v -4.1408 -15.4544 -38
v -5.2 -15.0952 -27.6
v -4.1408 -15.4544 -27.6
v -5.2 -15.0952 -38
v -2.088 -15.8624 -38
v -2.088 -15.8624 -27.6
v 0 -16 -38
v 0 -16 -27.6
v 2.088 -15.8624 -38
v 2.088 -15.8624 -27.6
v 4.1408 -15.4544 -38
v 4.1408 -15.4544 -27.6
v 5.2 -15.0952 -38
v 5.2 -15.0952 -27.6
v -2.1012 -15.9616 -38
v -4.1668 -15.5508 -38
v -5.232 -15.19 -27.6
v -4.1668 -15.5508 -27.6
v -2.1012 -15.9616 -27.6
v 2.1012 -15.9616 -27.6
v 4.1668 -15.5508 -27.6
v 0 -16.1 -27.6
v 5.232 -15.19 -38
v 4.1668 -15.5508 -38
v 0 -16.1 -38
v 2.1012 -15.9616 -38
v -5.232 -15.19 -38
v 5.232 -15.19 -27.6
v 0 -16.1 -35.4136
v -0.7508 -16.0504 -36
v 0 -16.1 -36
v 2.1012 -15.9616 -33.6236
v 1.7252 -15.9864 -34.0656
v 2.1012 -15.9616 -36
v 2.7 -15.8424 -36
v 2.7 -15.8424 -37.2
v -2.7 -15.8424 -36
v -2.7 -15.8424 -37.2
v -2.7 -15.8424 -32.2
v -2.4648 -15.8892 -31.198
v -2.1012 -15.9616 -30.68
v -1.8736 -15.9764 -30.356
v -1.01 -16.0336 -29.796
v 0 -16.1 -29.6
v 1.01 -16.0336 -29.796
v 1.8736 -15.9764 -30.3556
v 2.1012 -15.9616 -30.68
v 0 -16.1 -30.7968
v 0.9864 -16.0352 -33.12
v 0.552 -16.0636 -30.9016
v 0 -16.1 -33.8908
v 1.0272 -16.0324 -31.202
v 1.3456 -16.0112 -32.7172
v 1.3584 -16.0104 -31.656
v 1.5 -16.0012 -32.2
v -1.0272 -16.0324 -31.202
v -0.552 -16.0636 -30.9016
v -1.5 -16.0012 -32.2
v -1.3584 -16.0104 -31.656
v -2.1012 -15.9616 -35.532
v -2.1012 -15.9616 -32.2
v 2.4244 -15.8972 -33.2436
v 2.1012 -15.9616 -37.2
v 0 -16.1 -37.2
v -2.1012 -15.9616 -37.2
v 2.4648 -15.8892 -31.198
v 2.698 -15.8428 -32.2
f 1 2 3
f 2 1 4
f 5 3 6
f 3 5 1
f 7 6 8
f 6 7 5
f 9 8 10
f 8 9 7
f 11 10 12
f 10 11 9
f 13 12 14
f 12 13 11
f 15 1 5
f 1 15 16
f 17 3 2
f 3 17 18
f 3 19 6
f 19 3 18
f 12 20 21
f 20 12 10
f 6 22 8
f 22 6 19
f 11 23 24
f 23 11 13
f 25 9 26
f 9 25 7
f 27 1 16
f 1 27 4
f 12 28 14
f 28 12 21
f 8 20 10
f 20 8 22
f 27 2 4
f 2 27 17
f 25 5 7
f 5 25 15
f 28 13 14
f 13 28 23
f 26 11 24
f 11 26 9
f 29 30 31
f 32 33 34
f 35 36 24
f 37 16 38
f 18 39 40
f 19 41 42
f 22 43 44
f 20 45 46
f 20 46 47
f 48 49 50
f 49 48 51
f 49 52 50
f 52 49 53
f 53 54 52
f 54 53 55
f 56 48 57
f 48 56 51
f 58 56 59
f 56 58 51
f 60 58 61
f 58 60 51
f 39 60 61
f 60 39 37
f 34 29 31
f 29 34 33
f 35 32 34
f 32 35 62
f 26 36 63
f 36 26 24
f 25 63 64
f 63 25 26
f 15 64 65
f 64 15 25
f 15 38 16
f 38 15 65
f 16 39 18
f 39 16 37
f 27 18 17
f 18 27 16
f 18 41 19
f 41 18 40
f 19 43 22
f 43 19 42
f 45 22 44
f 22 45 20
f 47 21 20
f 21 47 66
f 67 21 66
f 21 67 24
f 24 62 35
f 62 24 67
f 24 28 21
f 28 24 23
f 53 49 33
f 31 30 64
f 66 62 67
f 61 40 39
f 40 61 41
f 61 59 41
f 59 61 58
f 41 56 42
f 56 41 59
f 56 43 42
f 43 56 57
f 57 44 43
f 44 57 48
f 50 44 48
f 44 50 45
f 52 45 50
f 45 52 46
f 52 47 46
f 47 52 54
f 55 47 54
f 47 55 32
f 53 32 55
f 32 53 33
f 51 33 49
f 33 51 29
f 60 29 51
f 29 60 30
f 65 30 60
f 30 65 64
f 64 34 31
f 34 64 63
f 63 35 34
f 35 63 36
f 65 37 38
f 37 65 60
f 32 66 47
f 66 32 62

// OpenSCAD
// file: s/6259b01.scad
use <../../lib.scad>
function ldraw_lib__s__6259b01() = [
// 0 ~Sticker Back  1.3 x  1.3 (Formed)
// 0 Name: s\6259b01.dat
// 0 Author: Chris Böhnke [KnightOfTarenta]
// 0 !LDRAW_ORG Subpart UPDATE 2026-06
// 0 !LICENSE Licensed under CC BY 4.0 : see CAreadme.txt
// 
// 0 BFC CERTIFY CCW
  [0,"BFC","CERTIFY"],
  [0,"BFC","CCW"],
// 
// 0 !HISTORY 2026-06-28 [OrionP] Official Update 2026-06
// 
// 0 // Sticker Backside
// 4 16 -13 69 -37.738 -10.352 69 -38.636 -10.352 95 -38.636 -13 95 -37.738
  [4,16,-13,69,-37.738,-10.352,69,-38.636,-10.352,95,-38.636,-13,95,-37.738],
// 4 16 -10.352 69 -38.636 -5.22 69 -39.656 -5.22 95 -39.656 -10.352 95 -38.636
  [4,16,-10.352,69,-38.636,-5.22,69,-39.656,-5.22,95,-39.656,-10.352,95,-38.636],
// 4 16 -5.22 95 -39.656 -5.22 69 -39.656 0 69 -40 0 95 -40
  [4,16,-5.22,95,-39.656,-5.22,69,-39.656,0,69,-40,0,95,-40],
// 4 16 0 69 -40 5.22 69 -39.656 5.22 95 -39.656 0 95 -40
  [4,16,0,69,-40,5.22,69,-39.656,5.22,95,-39.656,0,95,-40],
// 4 16 5.22 69 -39.656 10.352 69 -38.636 10.352 95 -38.636 5.22 95 -39.656
  [4,16,5.22,69,-39.656,10.352,69,-38.636,10.352,95,-38.636,5.22,95,-39.656],
// 4 16 10.352 69 -38.636 13 69 -37.738 13 95 -37.738 10.352 95 -38.636
  [4,16,10.352,69,-38.636,13,69,-37.738,13,95,-37.738,10.352,95,-38.636],
// 
// 0 // Conditional Lines Back
// 5 24 -10.352 69 -38.636 -10.352 95 -38.636 -5.22 69 -39.656 -13 95 -37.738
  [5,24,-10.352,69,-38.636,-10.352,95,-38.636,-5.22,69,-39.656,-13,95,-37.738],
// 5 24 -5.22 69 -39.656 -5.22 95 -39.656 0 69 -40 -10.352 95 -38.636
  [5,24,-5.22,69,-39.656,-5.22,95,-39.656,0,69,-40,-10.352,95,-38.636],
// 5 24 10.352 69 -38.636 10.352 95 -38.636 5.22 95 -39.656 13 69 -37.738
  [5,24,10.352,69,-38.636,10.352,95,-38.636,5.22,95,-39.656,13,69,-37.738],
// 5 24 0 69 -40 0 95 -40 5.22 69 -39.656 -5.22 95 -39.656
  [5,24,0,69,-40,0,95,-40,5.22,69,-39.656,-5.22,95,-39.656],
// 5 24 5.22 69 -39.656 5.22 95 -39.656 10.352 69 -38.636 0 95 -40
  [5,24,5.22,69,-39.656,5.22,95,-39.656,10.352,69,-38.636,0,95,-40],
// 
// 0 // Sticker Sides
// 4 16 -10.417 95 -38.877 -10.352 95 -38.636 -5.22 95 -39.656 -5.253 95 -39.904
  [4,16,-10.417,95,-38.877,-10.352,95,-38.636,-5.22,95,-39.656,-5.253,95,-39.904],
// 4 16 -10.417 69 -38.877 -10.352 69 -38.636 -13 69 -37.738 -13.08 69 -37.975
  [4,16,-10.417,69,-38.877,-10.352,69,-38.636,-13,69,-37.738,-13.08,69,-37.975],
// 4 16 -5.253 69 -39.904 -5.22 69 -39.656 -10.352 69 -38.636 -10.417 69 -38.877
  [4,16,-5.253,69,-39.904,-5.22,69,-39.656,-10.352,69,-38.636,-10.417,69,-38.877],
// 4 16 5.22 69 -39.656 5.253 69 -39.904 10.417 69 -38.877 10.352 69 -38.636
  [4,16,5.22,69,-39.656,5.253,69,-39.904,10.417,69,-38.877,10.352,69,-38.636],
// 4 16 0 69 -40.25 0 69 -40 -5.22 69 -39.656 -5.253 69 -39.904
  [4,16,0,69,-40.25,0,69,-40,-5.22,69,-39.656,-5.253,69,-39.904],
// 4 16 13 95 -37.738 13.08 95 -37.975 10.417 95 -38.877 10.352 95 -38.636
  [4,16,13,95,-37.738,13.08,95,-37.975,10.417,95,-38.877,10.352,95,-38.636],
// 4 16 0 95 -40.25 0 95 -40 5.22 95 -39.656 5.253 95 -39.904
  [4,16,0,95,-40.25,0,95,-40,5.22,95,-39.656,5.253,95,-39.904],
// 4 16 -10.352 95 -38.636 -10.417 95 -38.877 -13.08 95 -37.975 -13 95 -37.738
  [4,16,-10.352,95,-38.636,-10.417,95,-38.877,-13.08,95,-37.975,-13,95,-37.738],
// 4 16 13.08 69 -37.975 13 69 -37.738 10.352 69 -38.636 10.417 69 -38.877
  [4,16,13.08,69,-37.975,13,69,-37.738,10.352,69,-38.636,10.417,69,-38.877],
// 4 16 5.253 69 -39.904 5.22 69 -39.656 0 69 -40 0 69 -40.25
  [4,16,5.253,69,-39.904,5.22,69,-39.656,0,69,-40,0,69,-40.25],
// 4 16 -13.08 69 -37.975 -13 69 -37.738 -13 95 -37.738 -13.08 95 -37.975
  [4,16,-13.08,69,-37.975,-13,69,-37.738,-13,95,-37.738,-13.08,95,-37.975],
// 4 16 0 95 -40 0 95 -40.25 -5.253 95 -39.904 -5.22 95 -39.656
  [4,16,0,95,-40,0,95,-40.25,-5.253,95,-39.904,-5.22,95,-39.656],
// 4 16 13.08 95 -37.975 13 95 -37.738 13 69 -37.738 13.08 69 -37.975
  [4,16,13.08,95,-37.975,13,95,-37.738,13,69,-37.738,13.08,69,-37.975],
// 4 16 10.352 95 -38.636 10.417 95 -38.877 5.253 95 -39.904 5.22 95 -39.656
  [4,16,10.352,95,-38.636,10.417,95,-38.877,5.253,95,-39.904,5.22,95,-39.656],
// 
// 0 // Conditional Lines Front
// 5 24 0 95 -40.25 0 69 -40.25 5.253 95 -39.904 -5.253 69 -39.904
  [5,24,0,95,-40.25,0,69,-40.25,5.253,95,-39.904,-5.253,69,-39.904],
// 5 24 -5.253 95 -39.904 -5.253 69 -39.904 -10.417 69 -38.877 0 95 -40.25
  [5,24,-5.253,95,-39.904,-5.253,69,-39.904,-10.417,69,-38.877,0,95,-40.25],
// 5 24 5.253 95 -39.904 5.253 69 -39.904 0 69 -40.25 10.417 95 -38.877
  [5,24,5.253,95,-39.904,5.253,69,-39.904,0,69,-40.25,10.417,95,-38.877],
// 5 24 10.417 95 -38.877 10.417 69 -38.877 5.253 69 -39.904 13.08 95 -37.975
  [5,24,10.417,95,-38.877,10.417,69,-38.877,5.253,69,-39.904,13.08,95,-37.975],
// 5 24 -10.417 95 -38.877 -10.417 69 -38.877 -13.08 69 -37.975 -5.253 95 -39.904
  [5,24,-10.417,95,-38.877,-10.417,69,-38.877,-13.08,69,-37.975,-5.253,95,-39.904],
];
module ldraw_lib__s__6259b01(step=0, col=false, unit=2/5, alt=false, line=0.2, solid=!$preview)
    makepoly(ldraw_lib__s__6259b01(), step=step, col=col, unit=unit, alt=alt, line=line, solid=solid);
ldraw_lib__s__6259b01(line=0.2);
// main file
use <../lib.scad>
use <s/6259b01.scad>
function ldraw_lib__169665fc01() = [
// 0 Sticker  1.3 x  1.3 with Black Number "2" (Formed)
// 0 Name: 169665fc01.dat
// 0 Author: Chris Böhnke [KnightOfTarenta]
// 0 !LDRAW_ORG Part UPDATE 2026-06
// 0 !LICENSE Licensed under CC BY 4.0 : see CAreadme.txt
// 
// 0 BFC CERTIFY CCW
  [0,"BFC","CERTIFY"],
  [0,"BFC","CCW"],
// 
// 0 !KEYWORDS Booster Rocket, Bricklink 6339stk01, Brickowl 588738, Launch Command
// 0 !KEYWORDS Rebrickable 169665, set 6339, Shuttle Launch Pad, space port, town
// 
// 0 !HISTORY 2026-06-28 [OrionP] Official Update 2026-06
// 
// 1 16 0 0 0 1 0 0 0 1 0 0 0 1 s\6259b01.dat
  [1,16,0,0,0,1,0,0,0,1,0,0,0,1, ldraw_lib__s__6259b01()],
// 
// 0 // Colour 16 Main Colour
// 3 16 0 88.534 -40.25 -1.877 90 -40.126 0 90 -40.25
  [3,16,0,88.534,-40.25,-1.877,90,-40.126,0,90,-40.25],
// 3 16 5.253 84.059 -39.904 4.313 85.164 -39.966 5.253 90 -39.904
  [3,16,5.253,84.059,-39.904,4.313,85.164,-39.966,5.253,90,-39.904],
// 3 16 6.75 90 -39.606 6.75 93 -39.606 10.417 95 -38.877
  [3,16,6.75,90,-39.606,6.75,93,-39.606,10.417,95,-38.877],
// 3 16 -6.75 90 -39.606 -10.417 95 -38.877 -6.75 93 -39.606
  [3,16,-6.75,90,-39.606,-10.417,95,-38.877,-6.75,93,-39.606],
// 3 16 -10.417 69 -38.877 -6.75 80.5 -39.606 -6.162 77.995 -39.723
  [3,16,-10.417,69,-38.877,-6.75,80.5,-39.606,-6.162,77.995,-39.723],
// 3 16 -5.253 69 -39.904 -5.253 76.7 -39.904 -4.684 75.89 -39.941
  [3,16,-5.253,69,-39.904,-5.253,76.7,-39.904,-4.684,75.89,-39.941],
// 3 16 0 69 -40.25 -2.525 74.49 -40.084 0 74 -40.25
  [3,16,0,69,-40.25,-2.525,74.49,-40.084,0,74,-40.25],
// 3 16 5.253 69 -39.904 2.525 74.49 -40.084 4.684 75.889 -39.941
  [3,16,5.253,69,-39.904,2.525,74.49,-40.084,4.684,75.889,-39.941],
// 3 16 5.253 69 -39.904 4.684 75.889 -39.941 5.253 76.7 -39.904
  [3,16,5.253,69,-39.904,4.684,75.889,-39.941,5.253,76.7,-39.904],
// 4 16 1.38 77.254 -40.159 0 76.992 -40.25 0 84.727 -40.25 2.466 82.8 -40.088
  [4,16,1.38,77.254,-40.159,0,76.992,-40.25,0,84.727,-40.25,2.466,82.8,-40.088],
// 4 16 2.568 78.005 -40.081 1.38 77.254 -40.159 2.466 82.8 -40.088 3.364 81.793 -40.028
  [4,16,2.568,78.005,-40.081,1.38,77.254,-40.159,2.466,82.8,-40.088,3.364,81.793,-40.028],
// 4 16 3.396 79.14 -40.026 2.568 78.005 -40.081 3.364 81.793 -40.028 3.75 80.5 -40.003
  [4,16,3.396,79.14,-40.026,2.568,78.005,-40.081,3.364,81.793,-40.028,3.75,80.5,-40.003],
// 4 16 0 84.727 -40.25 0 76.992 -40.25 -1.38 77.254 -40.159 -2.568 78.005 -40.081
  [4,16,0,84.727,-40.25,0,76.992,-40.25,-1.38,77.254,-40.159,-2.568,78.005,-40.081],
// 4 16 0 84.727 -40.25 -2.568 78.005 -40.081 -3.396 79.14 -40.026 -3.75 80.5 -40.003
  [4,16,0,84.727,-40.25,-2.568,78.005,-40.081,-3.396,79.14,-40.026,-3.75,80.5,-40.003],
// 4 16 -5.253 88.83 -39.904 0 84.727 -40.25 -3.75 80.5 -40.003 -5.253 80.5 -39.904
  [4,16,-5.253,88.83,-39.904,0,84.727,-40.25,-3.75,80.5,-40.003,-5.253,80.5,-39.904],
// 4 16 -5.253 88.83 -39.904 -5.253 80.5 -39.904 -6.75 80.5 -39.606 -6.75 90 -39.606
  [4,16,-5.253,88.83,-39.904,-5.253,80.5,-39.904,-6.75,80.5,-39.606,-6.75,90,-39.606],
// 4 16 0 88.534 -40.25 0 90 -40.25 5.253 90 -39.904 4.313 85.164 -39.966
  [4,16,0,88.534,-40.25,0,90,-40.25,5.253,90,-39.904,4.313,85.164,-39.966],
// 4 16 6.061 83.109 -39.743 5.253 84.059 -39.904 5.253 90 -39.904 6.75 90 -39.606
  [4,16,6.061,83.109,-39.743,5.253,84.059,-39.904,5.253,90,-39.904,6.75,90,-39.606],
// 4 16 5.253 95 -39.904 10.417 95 -38.877 6.75 93 -39.606 5.253 93 -39.904
  [4,16,5.253,95,-39.904,10.417,95,-38.877,6.75,93,-39.606,5.253,93,-39.904],
// 4 16 0 95 -40.25 5.253 95 -39.904 5.253 93 -39.904 0 93 -40.25
  [4,16,0,95,-40.25,5.253,95,-39.904,5.253,93,-39.904,0,93,-40.25],
// 4 16 -5.253 95 -39.904 0 95 -40.25 0 93 -40.25 -5.253 93 -39.904
  [4,16,-5.253,95,-39.904,0,95,-40.25,0,93,-40.25,-5.253,93,-39.904],
// 4 16 -5.253 95 -39.904 -5.253 93 -39.904 -6.75 93 -39.606 -10.417 95 -38.877
  [4,16,-5.253,95,-39.904,-5.253,93,-39.904,-6.75,93,-39.606,-10.417,95,-38.877],
// 4 16 -10.417 95 -38.877 -6.75 90 -39.606 -6.75 80.5 -39.606 -10.417 69 -38.877
  [4,16,-10.417,95,-38.877,-6.75,90,-39.606,-6.75,80.5,-39.606,-10.417,69,-38.877],
// 4 16 -10.417 95 -38.877 -10.417 69 -38.877 -13.08 69 -37.975 -13.08 95 -37.975
  [4,16,-10.417,95,-38.877,-10.417,69,-38.877,-13.08,69,-37.975,-13.08,95,-37.975],
// 4 16 -10.417 69 -38.877 -6.162 77.995 -39.723 -5.253 76.7 -39.904 -5.253 69 -39.904
  [4,16,-10.417,69,-38.877,-6.162,77.995,-39.723,-5.253,76.7,-39.904,-5.253,69,-39.904],
// 4 16 -5.253 69 -39.904 -4.684 75.89 -39.941 -2.525 74.49 -40.084 0 69 -40.25
  [4,16,-5.253,69,-39.904,-4.684,75.89,-39.941,-2.525,74.49,-40.084,0,69,-40.25],
// 4 16 5.253 69 -39.904 0 69 -40.25 0 74 -40.25 2.525 74.49 -40.084
  [4,16,5.253,69,-39.904,0,69,-40.25,0,74,-40.25,2.525,74.49,-40.084],
// 4 16 10.417 69 -38.877 5.253 69 -39.904 5.253 76.7 -39.904 6.162 77.995 -39.723
  [4,16,10.417,69,-38.877,5.253,69,-39.904,5.253,76.7,-39.904,6.162,77.995,-39.723],
// 4 16 10.417 69 -38.877 6.162 77.995 -39.723 6.745 80.5 -39.607 10.417 95 -38.877
  [4,16,10.417,69,-38.877,6.162,77.995,-39.723,6.745,80.5,-39.607,10.417,95,-38.877],
// 4 16 10.417 95 -38.877 6.745 80.5 -39.607 6.061 83.109 -39.743 6.75 90 -39.606
  [4,16,10.417,95,-38.877,6.745,80.5,-39.607,6.061,83.109,-39.743,6.75,90,-39.606],
// 4 16 10.417 69 -38.877 10.417 95 -38.877 13.08 95 -37.975 13.08 69 -37.975
  [4,16,10.417,69,-38.877,10.417,95,-38.877,13.08,95,-37.975,13.08,69,-37.975],
// 
// 0 BFC NOCLIP
  [0,"BFC","NOCLIP"],
// 0 // Colour 0 Black
// 3 0 3.364 81.793 -40.028 2.466 82.8 -40.088 4.313 85.164 -39.966
  [3,0,3.364,81.793,-40.028,2.466,82.8,-40.088,4.313,85.164,-39.966],
// 3 0 0 90 -40.25 -1.877 90 -40.126 0 93 -40.25
  [3,0,0,90,-40.25,-1.877,90,-40.126,0,93,-40.25],
// 3 0 6.162 77.995 -39.723 6.061 83.109 -39.743 6.745 80.5 -39.607
  [3,0,6.162,77.995,-39.723,6.061,83.109,-39.743,6.745,80.5,-39.607],
// 4 0 -6.162 77.995 -39.723 -6.75 80.5 -39.606 -5.253 80.5 -39.904 -5.253 76.7 -39.904
  [4,0,-6.162,77.995,-39.723,-6.75,80.5,-39.606,-5.253,80.5,-39.904,-5.253,76.7,-39.904],
// 4 0 -5.253 76.7 -39.904 -5.253 80.5 -39.904 -3.75 80.5 -40.003 -3.396 79.14 -40.026
  [4,0,-5.253,76.7,-39.904,-5.253,80.5,-39.904,-3.75,80.5,-40.003,-3.396,79.14,-40.026],
// 4 0 -4.684 75.89 -39.941 -5.253 76.7 -39.904 -3.396 79.14 -40.026 -2.568 78.005 -40.081
  [4,0,-4.684,75.89,-39.941,-5.253,76.7,-39.904,-3.396,79.14,-40.026,-2.568,78.005,-40.081],
// 4 0 -2.525 74.49 -40.084 -4.684 75.89 -39.941 -2.568 78.005 -40.081 -1.38 77.254 -40.159
  [4,0,-2.525,74.49,-40.084,-4.684,75.89,-39.941,-2.568,78.005,-40.081,-1.38,77.254,-40.159],
// 4 0 0 74 -40.25 -2.525 74.49 -40.084 -1.38 77.254 -40.159 0 76.992 -40.25
  [4,0,0,74,-40.25,-2.525,74.49,-40.084,-1.38,77.254,-40.159,0,76.992,-40.25],
// 4 0 2.525 74.49 -40.084 0 74 -40.25 0 76.992 -40.25 1.38 77.254 -40.159
  [4,0,2.525,74.49,-40.084,0,74,-40.25,0,76.992,-40.25,1.38,77.254,-40.159],
// 4 0 4.684 75.889 -39.941 2.525 74.49 -40.084 1.38 77.254 -40.159 2.568 78.005 -40.081
  [4,0,4.684,75.889,-39.941,2.525,74.49,-40.084,1.38,77.254,-40.159,2.568,78.005,-40.081],
// 4 0 5.253 76.7 -39.904 4.684 75.889 -39.941 2.568 78.005 -40.081 3.396 79.14 -40.026
  [4,0,5.253,76.7,-39.904,4.684,75.889,-39.941,2.568,78.005,-40.081,3.396,79.14,-40.026],
// 4 0 5.253 76.7 -39.904 3.396 79.14 -40.026 3.75 80.5 -40.003 5.253 84.059 -39.904
  [4,0,5.253,76.7,-39.904,3.396,79.14,-40.026,3.75,80.5,-40.003,5.253,84.059,-39.904],
// 4 0 5.253 84.059 -39.904 3.75 80.5 -40.003 3.364 81.793 -40.028 4.313 85.164 -39.966
  [4,0,5.253,84.059,-39.904,3.75,80.5,-40.003,3.364,81.793,-40.028,4.313,85.164,-39.966],
// 4 0 4.313 85.164 -39.966 2.466 82.8 -40.088 0 84.727 -40.25 0 88.534 -40.25
  [4,0,4.313,85.164,-39.966,2.466,82.8,-40.088,0,84.727,-40.25,0,88.534,-40.25],
// 4 0 0 88.534 -40.25 0 84.727 -40.25 -5.253 88.83 -39.904 -1.877 90 -40.126
  [4,0,0,88.534,-40.25,0,84.727,-40.25,-5.253,88.83,-39.904,-1.877,90,-40.126],
// 4 0 -1.877 90 -40.126 -5.253 88.83 -39.904 -5.253 93 -39.904 0 93 -40.25
  [4,0,-1.877,90,-40.126,-5.253,88.83,-39.904,-5.253,93,-39.904,0,93,-40.25],
// 4 0 0 90 -40.25 0 93 -40.25 5.253 93 -39.904 5.253 90 -39.904
  [4,0,0,90,-40.25,0,93,-40.25,5.253,93,-39.904,5.253,90,-39.904],
// 4 0 5.253 90 -39.904 5.253 93 -39.904 6.75 93 -39.606 6.75 90 -39.606
  [4,0,5.253,90,-39.904,5.253,93,-39.904,6.75,93,-39.606,6.75,90,-39.606],
// 4 0 -5.253 93 -39.904 -5.253 88.83 -39.904 -6.75 90 -39.606 -6.75 93 -39.606
  [4,0,-5.253,93,-39.904,-5.253,88.83,-39.904,-6.75,90,-39.606,-6.75,93,-39.606],
// 4 0 6.162 77.995 -39.723 5.253 76.7 -39.904 5.253 84.059 -39.904 6.061 83.109 -39.743
  [4,0,6.162,77.995,-39.723,5.253,76.7,-39.904,5.253,84.059,-39.904,6.061,83.109,-39.743],
];
module ldraw_lib__169665fc01(step=0, col=false, unit=2/5, alt=false, line=0.2, solid=!$preview)
    makepoly(ldraw_lib__169665fc01(), step=step, col=col, unit=unit, alt=alt, line=line, solid=solid);
ldraw_lib__169665fc01(line=0.2);
